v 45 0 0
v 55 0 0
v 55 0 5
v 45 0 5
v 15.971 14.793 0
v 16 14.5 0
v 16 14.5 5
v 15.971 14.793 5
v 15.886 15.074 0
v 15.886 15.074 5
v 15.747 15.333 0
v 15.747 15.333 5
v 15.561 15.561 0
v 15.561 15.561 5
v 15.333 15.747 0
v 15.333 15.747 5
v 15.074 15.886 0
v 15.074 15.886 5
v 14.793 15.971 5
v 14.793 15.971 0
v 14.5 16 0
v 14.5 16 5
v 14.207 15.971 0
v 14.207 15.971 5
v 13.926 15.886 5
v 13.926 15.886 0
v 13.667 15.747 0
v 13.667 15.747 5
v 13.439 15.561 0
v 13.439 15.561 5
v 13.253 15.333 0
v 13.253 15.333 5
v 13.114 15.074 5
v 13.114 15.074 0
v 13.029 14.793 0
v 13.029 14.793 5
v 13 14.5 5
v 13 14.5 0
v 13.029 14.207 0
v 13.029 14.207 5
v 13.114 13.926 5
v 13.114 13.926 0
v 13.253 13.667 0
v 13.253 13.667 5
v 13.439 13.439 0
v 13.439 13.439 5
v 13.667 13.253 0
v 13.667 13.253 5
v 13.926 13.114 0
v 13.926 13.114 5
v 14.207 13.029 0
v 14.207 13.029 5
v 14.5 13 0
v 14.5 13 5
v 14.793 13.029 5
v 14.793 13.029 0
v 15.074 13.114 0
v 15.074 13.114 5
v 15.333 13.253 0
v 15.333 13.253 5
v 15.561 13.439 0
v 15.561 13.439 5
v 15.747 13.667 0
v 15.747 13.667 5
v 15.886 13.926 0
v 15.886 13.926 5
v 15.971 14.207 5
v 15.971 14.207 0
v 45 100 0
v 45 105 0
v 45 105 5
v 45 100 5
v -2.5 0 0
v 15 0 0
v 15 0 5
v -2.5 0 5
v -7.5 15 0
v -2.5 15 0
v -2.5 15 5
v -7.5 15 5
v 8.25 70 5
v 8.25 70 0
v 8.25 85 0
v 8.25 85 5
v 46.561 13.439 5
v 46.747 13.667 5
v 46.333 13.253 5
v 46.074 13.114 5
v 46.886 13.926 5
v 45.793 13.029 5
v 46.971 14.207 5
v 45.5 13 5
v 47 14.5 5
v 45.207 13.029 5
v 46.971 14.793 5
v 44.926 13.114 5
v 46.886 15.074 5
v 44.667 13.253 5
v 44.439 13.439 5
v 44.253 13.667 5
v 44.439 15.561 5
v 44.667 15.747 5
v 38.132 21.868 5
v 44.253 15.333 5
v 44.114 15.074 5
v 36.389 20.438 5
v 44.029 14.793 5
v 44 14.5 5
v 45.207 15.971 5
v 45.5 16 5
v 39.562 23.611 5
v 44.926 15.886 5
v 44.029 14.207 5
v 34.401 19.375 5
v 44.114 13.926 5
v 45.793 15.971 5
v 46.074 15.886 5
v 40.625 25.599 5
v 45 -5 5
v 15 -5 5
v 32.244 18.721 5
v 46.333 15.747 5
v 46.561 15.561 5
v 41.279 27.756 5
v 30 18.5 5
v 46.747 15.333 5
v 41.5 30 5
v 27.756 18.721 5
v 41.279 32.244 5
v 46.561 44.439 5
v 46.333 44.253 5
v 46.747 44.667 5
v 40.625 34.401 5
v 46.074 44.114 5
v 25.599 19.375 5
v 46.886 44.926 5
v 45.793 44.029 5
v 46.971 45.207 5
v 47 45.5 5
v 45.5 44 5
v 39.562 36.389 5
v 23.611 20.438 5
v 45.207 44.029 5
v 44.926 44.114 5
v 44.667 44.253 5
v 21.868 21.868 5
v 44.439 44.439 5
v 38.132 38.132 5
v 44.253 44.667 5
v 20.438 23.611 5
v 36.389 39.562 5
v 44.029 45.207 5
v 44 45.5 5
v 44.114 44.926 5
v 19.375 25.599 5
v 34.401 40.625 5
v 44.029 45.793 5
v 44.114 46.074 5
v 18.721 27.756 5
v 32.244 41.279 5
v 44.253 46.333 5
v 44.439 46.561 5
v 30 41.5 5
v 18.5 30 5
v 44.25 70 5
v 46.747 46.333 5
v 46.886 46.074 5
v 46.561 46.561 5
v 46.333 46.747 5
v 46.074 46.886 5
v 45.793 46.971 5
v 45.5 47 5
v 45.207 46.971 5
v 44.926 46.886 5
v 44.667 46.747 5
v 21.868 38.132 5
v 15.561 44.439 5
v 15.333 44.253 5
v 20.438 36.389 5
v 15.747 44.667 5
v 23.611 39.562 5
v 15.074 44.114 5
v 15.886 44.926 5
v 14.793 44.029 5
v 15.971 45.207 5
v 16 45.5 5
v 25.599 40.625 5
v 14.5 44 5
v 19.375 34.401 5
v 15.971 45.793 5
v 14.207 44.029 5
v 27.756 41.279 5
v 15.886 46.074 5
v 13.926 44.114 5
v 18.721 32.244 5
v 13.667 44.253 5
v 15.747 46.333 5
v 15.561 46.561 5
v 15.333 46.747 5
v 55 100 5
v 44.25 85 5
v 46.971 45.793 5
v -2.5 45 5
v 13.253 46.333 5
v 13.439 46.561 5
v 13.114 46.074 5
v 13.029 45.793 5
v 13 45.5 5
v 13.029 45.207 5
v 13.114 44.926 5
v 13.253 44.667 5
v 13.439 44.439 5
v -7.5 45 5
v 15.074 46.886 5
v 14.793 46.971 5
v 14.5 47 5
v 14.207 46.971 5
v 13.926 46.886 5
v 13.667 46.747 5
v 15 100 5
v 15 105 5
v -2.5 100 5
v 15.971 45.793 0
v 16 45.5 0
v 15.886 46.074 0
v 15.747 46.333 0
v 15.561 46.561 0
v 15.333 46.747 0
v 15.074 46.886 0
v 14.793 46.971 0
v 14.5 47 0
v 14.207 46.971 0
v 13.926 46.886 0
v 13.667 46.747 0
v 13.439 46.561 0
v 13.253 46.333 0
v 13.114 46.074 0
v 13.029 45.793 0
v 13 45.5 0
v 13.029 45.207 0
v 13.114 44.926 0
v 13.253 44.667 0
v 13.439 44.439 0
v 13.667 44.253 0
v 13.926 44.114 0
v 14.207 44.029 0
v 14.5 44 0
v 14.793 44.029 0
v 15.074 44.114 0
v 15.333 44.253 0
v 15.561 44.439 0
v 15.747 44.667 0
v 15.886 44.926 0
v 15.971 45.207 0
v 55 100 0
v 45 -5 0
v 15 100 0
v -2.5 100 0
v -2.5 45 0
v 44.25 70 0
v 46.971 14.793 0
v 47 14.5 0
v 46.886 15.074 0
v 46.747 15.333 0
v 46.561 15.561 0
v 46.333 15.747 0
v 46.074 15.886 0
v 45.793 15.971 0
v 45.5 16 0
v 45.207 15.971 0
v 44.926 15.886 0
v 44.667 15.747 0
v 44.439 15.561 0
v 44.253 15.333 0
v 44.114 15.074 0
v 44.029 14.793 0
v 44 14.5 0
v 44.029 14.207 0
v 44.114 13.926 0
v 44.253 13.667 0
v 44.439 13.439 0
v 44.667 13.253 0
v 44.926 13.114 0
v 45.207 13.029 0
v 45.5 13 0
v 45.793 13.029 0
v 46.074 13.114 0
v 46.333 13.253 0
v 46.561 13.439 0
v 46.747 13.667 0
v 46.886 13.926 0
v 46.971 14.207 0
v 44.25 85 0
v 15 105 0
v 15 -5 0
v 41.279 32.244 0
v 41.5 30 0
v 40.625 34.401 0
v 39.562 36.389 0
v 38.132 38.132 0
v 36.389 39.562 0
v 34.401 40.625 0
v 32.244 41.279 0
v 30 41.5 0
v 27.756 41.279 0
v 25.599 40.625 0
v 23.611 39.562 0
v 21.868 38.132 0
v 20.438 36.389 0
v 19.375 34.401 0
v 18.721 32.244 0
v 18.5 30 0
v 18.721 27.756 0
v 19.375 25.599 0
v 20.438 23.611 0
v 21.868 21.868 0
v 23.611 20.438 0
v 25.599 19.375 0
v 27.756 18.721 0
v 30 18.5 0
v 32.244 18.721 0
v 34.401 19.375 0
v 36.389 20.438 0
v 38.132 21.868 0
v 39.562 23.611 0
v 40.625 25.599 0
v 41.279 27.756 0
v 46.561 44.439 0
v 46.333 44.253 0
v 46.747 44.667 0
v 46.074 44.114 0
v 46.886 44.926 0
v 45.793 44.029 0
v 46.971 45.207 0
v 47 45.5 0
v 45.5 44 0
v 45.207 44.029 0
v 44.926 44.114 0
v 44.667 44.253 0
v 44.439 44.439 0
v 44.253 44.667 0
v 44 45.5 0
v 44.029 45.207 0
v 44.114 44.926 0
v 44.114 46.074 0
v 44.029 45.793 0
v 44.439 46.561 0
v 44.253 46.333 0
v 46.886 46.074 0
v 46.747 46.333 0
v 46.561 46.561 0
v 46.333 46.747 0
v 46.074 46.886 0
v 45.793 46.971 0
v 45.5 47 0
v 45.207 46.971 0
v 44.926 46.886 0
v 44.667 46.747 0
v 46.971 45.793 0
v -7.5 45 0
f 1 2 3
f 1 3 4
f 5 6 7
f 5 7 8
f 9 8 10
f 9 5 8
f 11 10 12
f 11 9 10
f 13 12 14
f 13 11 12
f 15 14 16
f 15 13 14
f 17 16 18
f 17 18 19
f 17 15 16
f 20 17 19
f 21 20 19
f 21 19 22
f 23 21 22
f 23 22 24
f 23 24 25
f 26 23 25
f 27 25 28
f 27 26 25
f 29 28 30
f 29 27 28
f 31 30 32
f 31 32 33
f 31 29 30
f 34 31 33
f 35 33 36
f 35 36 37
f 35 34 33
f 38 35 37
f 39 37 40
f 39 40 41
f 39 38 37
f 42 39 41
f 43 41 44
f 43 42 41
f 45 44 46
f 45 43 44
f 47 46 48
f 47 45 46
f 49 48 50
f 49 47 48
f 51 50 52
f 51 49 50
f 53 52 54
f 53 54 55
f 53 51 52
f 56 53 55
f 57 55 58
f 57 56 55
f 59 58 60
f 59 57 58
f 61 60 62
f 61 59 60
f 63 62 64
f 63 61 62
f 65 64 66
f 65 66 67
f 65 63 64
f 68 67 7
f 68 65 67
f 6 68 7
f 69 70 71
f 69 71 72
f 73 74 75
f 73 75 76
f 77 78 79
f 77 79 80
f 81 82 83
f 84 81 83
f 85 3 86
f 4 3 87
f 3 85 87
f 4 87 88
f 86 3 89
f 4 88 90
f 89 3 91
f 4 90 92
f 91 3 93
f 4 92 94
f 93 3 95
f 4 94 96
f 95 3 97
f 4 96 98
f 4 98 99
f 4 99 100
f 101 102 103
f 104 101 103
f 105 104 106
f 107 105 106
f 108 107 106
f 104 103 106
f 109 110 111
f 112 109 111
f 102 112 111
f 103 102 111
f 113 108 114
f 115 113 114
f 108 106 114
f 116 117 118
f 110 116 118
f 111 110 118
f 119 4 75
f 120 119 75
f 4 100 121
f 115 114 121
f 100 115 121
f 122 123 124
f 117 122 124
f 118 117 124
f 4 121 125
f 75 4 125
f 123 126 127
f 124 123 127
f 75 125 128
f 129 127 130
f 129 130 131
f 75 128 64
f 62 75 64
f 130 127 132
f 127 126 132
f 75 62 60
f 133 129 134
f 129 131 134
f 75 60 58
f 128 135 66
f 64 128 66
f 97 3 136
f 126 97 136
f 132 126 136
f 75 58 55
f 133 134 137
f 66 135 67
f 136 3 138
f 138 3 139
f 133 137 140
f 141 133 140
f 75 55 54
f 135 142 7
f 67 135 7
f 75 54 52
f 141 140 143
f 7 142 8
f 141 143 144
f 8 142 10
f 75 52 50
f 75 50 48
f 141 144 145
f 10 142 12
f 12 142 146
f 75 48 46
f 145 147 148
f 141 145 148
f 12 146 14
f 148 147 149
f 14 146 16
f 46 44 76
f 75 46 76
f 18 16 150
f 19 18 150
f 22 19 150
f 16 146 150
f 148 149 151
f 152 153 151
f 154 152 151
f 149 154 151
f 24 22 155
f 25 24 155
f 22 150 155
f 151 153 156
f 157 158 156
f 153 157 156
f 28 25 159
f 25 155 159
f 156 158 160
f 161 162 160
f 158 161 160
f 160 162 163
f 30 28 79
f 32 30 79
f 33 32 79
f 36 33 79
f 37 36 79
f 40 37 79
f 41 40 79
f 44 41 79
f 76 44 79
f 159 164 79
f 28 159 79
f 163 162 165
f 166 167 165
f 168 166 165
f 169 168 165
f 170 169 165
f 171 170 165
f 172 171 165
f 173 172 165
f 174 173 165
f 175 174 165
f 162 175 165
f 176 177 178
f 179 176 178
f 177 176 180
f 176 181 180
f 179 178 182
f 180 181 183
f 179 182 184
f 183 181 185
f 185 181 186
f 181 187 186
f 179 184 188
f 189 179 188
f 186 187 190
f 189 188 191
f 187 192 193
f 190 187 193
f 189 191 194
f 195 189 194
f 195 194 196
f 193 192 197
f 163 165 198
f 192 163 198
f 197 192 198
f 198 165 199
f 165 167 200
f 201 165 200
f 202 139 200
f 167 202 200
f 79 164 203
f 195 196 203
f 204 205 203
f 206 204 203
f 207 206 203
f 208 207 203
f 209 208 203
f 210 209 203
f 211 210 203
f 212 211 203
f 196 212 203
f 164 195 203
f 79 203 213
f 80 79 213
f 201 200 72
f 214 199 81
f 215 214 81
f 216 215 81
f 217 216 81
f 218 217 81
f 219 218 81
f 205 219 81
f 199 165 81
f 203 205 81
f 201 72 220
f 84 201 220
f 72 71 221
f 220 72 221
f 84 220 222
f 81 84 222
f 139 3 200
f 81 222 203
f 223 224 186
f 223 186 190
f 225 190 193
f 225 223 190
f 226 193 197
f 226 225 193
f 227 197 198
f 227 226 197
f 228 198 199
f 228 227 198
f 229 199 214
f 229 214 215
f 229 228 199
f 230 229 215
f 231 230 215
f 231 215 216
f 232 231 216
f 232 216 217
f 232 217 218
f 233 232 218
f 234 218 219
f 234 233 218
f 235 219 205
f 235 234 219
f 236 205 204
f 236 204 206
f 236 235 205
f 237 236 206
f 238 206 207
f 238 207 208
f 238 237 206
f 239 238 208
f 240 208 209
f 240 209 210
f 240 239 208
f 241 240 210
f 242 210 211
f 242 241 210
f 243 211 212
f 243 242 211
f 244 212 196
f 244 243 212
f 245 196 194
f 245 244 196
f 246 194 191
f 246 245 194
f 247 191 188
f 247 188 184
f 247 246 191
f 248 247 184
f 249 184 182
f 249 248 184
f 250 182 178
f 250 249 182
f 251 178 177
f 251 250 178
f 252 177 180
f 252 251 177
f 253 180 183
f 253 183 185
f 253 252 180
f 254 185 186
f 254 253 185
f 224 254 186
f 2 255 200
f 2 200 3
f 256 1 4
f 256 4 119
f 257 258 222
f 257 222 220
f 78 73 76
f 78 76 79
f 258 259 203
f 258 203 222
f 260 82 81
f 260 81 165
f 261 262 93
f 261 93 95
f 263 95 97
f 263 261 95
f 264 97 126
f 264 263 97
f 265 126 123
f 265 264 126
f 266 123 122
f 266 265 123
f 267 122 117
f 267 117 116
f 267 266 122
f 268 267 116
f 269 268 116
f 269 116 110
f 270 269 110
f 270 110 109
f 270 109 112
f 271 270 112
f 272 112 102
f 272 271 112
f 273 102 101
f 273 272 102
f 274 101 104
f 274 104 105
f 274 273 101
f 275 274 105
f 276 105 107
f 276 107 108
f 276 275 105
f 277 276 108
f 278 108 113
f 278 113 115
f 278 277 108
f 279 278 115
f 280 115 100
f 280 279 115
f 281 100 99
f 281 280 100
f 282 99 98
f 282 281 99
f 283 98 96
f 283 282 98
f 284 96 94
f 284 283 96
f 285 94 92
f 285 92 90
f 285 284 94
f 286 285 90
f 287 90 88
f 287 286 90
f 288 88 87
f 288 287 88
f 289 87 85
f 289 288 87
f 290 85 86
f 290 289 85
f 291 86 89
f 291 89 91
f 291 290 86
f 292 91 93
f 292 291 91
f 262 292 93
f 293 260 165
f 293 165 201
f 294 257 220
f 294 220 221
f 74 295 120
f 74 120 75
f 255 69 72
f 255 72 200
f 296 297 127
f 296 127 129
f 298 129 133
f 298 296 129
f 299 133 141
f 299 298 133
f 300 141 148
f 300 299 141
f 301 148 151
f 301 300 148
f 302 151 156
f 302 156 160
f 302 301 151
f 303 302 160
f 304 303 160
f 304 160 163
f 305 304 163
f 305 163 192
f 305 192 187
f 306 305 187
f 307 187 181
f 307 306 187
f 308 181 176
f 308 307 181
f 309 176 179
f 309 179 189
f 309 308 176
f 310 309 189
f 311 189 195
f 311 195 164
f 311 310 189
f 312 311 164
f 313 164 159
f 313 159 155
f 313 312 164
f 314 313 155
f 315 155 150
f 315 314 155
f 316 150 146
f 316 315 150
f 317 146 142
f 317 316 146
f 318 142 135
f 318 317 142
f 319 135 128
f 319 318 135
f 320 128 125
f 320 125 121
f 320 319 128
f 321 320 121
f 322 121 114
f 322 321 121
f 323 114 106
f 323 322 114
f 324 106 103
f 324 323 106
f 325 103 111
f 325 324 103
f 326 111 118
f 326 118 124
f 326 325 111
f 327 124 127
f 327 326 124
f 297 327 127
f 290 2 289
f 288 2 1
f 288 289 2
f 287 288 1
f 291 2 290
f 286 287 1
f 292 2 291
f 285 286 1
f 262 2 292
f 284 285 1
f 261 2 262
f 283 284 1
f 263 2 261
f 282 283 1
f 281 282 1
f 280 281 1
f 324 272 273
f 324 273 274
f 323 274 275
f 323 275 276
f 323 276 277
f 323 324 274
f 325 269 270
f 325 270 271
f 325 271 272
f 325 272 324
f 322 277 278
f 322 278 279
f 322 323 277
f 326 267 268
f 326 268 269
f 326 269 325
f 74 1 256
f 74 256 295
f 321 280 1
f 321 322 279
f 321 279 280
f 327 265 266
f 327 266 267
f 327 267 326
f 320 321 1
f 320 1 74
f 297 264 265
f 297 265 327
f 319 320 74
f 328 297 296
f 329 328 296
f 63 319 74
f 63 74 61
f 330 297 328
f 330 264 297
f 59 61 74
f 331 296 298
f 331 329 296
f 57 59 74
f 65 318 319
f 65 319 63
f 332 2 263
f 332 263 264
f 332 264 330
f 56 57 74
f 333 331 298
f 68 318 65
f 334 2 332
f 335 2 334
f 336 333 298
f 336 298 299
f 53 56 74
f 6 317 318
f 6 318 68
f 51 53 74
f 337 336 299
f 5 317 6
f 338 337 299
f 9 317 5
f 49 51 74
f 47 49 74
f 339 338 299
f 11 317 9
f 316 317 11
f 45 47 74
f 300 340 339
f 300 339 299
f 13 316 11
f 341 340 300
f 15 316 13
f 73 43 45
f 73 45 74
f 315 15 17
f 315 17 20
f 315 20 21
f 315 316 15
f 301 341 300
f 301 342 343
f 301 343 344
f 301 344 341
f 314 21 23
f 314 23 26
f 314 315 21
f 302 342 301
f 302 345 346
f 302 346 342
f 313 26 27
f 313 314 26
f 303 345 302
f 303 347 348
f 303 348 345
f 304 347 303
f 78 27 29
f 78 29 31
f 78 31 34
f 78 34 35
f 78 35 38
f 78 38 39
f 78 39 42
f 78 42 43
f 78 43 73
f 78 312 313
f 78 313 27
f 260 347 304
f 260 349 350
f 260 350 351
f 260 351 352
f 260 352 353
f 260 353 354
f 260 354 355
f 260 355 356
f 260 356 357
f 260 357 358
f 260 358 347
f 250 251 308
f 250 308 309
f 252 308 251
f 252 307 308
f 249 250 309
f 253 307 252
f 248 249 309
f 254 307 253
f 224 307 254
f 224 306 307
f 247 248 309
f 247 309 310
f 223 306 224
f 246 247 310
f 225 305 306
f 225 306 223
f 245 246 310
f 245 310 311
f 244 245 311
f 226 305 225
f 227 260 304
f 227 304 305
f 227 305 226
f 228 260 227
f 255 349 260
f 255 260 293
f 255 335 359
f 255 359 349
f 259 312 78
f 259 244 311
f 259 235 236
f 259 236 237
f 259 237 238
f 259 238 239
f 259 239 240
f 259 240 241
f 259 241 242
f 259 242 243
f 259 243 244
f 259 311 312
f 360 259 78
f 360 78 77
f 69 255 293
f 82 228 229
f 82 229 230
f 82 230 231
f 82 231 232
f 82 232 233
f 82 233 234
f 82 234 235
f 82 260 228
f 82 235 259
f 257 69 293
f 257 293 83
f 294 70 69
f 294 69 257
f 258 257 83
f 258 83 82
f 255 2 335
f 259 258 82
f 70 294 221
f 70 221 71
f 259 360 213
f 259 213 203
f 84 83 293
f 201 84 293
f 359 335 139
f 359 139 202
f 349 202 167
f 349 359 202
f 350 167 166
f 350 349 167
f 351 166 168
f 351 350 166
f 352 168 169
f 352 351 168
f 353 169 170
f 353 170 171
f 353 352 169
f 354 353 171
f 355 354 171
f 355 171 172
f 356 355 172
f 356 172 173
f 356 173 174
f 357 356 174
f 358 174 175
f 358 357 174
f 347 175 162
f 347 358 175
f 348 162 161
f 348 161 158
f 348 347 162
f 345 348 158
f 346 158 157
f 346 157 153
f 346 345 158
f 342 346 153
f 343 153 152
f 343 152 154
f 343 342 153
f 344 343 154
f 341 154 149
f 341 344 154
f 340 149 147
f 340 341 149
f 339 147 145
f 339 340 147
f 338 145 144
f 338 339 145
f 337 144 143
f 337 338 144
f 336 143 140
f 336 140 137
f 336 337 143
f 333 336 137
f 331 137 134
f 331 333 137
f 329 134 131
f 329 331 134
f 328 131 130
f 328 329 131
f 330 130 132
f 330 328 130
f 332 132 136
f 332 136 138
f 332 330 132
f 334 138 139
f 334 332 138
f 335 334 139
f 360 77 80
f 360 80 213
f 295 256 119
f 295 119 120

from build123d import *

# Parameters (mm, degrees)
SKETCH_1_R      = 11.5
SKETCH_1_R_2    = 1.5
SKETCH_1_W      = 36
SKETCH_1_H      = 15
EXTRUDE_1_DEPTH = 5


with BuildPart() as part:
    # 草图1 → 凸台-拉伸1 (new body)
    with BuildSketch(Plane.XY):
        Polygon((-2.5, 100), (15, 100), (15, 105), (45, 105), (45, 100), (55, 100), (55, 0), (45, 0), (45, -5), (15, -5), (15, 0), (-2.5, 0), (-2.5, 15), (-7.5, 15), (-7.5, 45), (-2.5, 45), align=None)
        with Locations((30, 30)):
            Circle(SKETCH_1_R, mode=Mode.SUBTRACT)
        with Locations((14.5, 45.5)):
            Circle(SKETCH_1_R_2, mode=Mode.SUBTRACT)
        with Locations((45.5, 45.5)):
            Circle(SKETCH_1_R_2, mode=Mode.SUBTRACT)
        with Locations((45.5, 14.5)):
            Circle(SKETCH_1_R_2, mode=Mode.SUBTRACT)
        with Locations((14.5, 14.5)):
            Circle(SKETCH_1_R_2, mode=Mode.SUBTRACT)
        with Locations((26.25, 77.5)):
            Rectangle(SKETCH_1_W, SKETCH_1_H, mode=Mode.SUBTRACT)
    extrude(amount=EXTRUDE_1_DEPTH)


solid = part.part
